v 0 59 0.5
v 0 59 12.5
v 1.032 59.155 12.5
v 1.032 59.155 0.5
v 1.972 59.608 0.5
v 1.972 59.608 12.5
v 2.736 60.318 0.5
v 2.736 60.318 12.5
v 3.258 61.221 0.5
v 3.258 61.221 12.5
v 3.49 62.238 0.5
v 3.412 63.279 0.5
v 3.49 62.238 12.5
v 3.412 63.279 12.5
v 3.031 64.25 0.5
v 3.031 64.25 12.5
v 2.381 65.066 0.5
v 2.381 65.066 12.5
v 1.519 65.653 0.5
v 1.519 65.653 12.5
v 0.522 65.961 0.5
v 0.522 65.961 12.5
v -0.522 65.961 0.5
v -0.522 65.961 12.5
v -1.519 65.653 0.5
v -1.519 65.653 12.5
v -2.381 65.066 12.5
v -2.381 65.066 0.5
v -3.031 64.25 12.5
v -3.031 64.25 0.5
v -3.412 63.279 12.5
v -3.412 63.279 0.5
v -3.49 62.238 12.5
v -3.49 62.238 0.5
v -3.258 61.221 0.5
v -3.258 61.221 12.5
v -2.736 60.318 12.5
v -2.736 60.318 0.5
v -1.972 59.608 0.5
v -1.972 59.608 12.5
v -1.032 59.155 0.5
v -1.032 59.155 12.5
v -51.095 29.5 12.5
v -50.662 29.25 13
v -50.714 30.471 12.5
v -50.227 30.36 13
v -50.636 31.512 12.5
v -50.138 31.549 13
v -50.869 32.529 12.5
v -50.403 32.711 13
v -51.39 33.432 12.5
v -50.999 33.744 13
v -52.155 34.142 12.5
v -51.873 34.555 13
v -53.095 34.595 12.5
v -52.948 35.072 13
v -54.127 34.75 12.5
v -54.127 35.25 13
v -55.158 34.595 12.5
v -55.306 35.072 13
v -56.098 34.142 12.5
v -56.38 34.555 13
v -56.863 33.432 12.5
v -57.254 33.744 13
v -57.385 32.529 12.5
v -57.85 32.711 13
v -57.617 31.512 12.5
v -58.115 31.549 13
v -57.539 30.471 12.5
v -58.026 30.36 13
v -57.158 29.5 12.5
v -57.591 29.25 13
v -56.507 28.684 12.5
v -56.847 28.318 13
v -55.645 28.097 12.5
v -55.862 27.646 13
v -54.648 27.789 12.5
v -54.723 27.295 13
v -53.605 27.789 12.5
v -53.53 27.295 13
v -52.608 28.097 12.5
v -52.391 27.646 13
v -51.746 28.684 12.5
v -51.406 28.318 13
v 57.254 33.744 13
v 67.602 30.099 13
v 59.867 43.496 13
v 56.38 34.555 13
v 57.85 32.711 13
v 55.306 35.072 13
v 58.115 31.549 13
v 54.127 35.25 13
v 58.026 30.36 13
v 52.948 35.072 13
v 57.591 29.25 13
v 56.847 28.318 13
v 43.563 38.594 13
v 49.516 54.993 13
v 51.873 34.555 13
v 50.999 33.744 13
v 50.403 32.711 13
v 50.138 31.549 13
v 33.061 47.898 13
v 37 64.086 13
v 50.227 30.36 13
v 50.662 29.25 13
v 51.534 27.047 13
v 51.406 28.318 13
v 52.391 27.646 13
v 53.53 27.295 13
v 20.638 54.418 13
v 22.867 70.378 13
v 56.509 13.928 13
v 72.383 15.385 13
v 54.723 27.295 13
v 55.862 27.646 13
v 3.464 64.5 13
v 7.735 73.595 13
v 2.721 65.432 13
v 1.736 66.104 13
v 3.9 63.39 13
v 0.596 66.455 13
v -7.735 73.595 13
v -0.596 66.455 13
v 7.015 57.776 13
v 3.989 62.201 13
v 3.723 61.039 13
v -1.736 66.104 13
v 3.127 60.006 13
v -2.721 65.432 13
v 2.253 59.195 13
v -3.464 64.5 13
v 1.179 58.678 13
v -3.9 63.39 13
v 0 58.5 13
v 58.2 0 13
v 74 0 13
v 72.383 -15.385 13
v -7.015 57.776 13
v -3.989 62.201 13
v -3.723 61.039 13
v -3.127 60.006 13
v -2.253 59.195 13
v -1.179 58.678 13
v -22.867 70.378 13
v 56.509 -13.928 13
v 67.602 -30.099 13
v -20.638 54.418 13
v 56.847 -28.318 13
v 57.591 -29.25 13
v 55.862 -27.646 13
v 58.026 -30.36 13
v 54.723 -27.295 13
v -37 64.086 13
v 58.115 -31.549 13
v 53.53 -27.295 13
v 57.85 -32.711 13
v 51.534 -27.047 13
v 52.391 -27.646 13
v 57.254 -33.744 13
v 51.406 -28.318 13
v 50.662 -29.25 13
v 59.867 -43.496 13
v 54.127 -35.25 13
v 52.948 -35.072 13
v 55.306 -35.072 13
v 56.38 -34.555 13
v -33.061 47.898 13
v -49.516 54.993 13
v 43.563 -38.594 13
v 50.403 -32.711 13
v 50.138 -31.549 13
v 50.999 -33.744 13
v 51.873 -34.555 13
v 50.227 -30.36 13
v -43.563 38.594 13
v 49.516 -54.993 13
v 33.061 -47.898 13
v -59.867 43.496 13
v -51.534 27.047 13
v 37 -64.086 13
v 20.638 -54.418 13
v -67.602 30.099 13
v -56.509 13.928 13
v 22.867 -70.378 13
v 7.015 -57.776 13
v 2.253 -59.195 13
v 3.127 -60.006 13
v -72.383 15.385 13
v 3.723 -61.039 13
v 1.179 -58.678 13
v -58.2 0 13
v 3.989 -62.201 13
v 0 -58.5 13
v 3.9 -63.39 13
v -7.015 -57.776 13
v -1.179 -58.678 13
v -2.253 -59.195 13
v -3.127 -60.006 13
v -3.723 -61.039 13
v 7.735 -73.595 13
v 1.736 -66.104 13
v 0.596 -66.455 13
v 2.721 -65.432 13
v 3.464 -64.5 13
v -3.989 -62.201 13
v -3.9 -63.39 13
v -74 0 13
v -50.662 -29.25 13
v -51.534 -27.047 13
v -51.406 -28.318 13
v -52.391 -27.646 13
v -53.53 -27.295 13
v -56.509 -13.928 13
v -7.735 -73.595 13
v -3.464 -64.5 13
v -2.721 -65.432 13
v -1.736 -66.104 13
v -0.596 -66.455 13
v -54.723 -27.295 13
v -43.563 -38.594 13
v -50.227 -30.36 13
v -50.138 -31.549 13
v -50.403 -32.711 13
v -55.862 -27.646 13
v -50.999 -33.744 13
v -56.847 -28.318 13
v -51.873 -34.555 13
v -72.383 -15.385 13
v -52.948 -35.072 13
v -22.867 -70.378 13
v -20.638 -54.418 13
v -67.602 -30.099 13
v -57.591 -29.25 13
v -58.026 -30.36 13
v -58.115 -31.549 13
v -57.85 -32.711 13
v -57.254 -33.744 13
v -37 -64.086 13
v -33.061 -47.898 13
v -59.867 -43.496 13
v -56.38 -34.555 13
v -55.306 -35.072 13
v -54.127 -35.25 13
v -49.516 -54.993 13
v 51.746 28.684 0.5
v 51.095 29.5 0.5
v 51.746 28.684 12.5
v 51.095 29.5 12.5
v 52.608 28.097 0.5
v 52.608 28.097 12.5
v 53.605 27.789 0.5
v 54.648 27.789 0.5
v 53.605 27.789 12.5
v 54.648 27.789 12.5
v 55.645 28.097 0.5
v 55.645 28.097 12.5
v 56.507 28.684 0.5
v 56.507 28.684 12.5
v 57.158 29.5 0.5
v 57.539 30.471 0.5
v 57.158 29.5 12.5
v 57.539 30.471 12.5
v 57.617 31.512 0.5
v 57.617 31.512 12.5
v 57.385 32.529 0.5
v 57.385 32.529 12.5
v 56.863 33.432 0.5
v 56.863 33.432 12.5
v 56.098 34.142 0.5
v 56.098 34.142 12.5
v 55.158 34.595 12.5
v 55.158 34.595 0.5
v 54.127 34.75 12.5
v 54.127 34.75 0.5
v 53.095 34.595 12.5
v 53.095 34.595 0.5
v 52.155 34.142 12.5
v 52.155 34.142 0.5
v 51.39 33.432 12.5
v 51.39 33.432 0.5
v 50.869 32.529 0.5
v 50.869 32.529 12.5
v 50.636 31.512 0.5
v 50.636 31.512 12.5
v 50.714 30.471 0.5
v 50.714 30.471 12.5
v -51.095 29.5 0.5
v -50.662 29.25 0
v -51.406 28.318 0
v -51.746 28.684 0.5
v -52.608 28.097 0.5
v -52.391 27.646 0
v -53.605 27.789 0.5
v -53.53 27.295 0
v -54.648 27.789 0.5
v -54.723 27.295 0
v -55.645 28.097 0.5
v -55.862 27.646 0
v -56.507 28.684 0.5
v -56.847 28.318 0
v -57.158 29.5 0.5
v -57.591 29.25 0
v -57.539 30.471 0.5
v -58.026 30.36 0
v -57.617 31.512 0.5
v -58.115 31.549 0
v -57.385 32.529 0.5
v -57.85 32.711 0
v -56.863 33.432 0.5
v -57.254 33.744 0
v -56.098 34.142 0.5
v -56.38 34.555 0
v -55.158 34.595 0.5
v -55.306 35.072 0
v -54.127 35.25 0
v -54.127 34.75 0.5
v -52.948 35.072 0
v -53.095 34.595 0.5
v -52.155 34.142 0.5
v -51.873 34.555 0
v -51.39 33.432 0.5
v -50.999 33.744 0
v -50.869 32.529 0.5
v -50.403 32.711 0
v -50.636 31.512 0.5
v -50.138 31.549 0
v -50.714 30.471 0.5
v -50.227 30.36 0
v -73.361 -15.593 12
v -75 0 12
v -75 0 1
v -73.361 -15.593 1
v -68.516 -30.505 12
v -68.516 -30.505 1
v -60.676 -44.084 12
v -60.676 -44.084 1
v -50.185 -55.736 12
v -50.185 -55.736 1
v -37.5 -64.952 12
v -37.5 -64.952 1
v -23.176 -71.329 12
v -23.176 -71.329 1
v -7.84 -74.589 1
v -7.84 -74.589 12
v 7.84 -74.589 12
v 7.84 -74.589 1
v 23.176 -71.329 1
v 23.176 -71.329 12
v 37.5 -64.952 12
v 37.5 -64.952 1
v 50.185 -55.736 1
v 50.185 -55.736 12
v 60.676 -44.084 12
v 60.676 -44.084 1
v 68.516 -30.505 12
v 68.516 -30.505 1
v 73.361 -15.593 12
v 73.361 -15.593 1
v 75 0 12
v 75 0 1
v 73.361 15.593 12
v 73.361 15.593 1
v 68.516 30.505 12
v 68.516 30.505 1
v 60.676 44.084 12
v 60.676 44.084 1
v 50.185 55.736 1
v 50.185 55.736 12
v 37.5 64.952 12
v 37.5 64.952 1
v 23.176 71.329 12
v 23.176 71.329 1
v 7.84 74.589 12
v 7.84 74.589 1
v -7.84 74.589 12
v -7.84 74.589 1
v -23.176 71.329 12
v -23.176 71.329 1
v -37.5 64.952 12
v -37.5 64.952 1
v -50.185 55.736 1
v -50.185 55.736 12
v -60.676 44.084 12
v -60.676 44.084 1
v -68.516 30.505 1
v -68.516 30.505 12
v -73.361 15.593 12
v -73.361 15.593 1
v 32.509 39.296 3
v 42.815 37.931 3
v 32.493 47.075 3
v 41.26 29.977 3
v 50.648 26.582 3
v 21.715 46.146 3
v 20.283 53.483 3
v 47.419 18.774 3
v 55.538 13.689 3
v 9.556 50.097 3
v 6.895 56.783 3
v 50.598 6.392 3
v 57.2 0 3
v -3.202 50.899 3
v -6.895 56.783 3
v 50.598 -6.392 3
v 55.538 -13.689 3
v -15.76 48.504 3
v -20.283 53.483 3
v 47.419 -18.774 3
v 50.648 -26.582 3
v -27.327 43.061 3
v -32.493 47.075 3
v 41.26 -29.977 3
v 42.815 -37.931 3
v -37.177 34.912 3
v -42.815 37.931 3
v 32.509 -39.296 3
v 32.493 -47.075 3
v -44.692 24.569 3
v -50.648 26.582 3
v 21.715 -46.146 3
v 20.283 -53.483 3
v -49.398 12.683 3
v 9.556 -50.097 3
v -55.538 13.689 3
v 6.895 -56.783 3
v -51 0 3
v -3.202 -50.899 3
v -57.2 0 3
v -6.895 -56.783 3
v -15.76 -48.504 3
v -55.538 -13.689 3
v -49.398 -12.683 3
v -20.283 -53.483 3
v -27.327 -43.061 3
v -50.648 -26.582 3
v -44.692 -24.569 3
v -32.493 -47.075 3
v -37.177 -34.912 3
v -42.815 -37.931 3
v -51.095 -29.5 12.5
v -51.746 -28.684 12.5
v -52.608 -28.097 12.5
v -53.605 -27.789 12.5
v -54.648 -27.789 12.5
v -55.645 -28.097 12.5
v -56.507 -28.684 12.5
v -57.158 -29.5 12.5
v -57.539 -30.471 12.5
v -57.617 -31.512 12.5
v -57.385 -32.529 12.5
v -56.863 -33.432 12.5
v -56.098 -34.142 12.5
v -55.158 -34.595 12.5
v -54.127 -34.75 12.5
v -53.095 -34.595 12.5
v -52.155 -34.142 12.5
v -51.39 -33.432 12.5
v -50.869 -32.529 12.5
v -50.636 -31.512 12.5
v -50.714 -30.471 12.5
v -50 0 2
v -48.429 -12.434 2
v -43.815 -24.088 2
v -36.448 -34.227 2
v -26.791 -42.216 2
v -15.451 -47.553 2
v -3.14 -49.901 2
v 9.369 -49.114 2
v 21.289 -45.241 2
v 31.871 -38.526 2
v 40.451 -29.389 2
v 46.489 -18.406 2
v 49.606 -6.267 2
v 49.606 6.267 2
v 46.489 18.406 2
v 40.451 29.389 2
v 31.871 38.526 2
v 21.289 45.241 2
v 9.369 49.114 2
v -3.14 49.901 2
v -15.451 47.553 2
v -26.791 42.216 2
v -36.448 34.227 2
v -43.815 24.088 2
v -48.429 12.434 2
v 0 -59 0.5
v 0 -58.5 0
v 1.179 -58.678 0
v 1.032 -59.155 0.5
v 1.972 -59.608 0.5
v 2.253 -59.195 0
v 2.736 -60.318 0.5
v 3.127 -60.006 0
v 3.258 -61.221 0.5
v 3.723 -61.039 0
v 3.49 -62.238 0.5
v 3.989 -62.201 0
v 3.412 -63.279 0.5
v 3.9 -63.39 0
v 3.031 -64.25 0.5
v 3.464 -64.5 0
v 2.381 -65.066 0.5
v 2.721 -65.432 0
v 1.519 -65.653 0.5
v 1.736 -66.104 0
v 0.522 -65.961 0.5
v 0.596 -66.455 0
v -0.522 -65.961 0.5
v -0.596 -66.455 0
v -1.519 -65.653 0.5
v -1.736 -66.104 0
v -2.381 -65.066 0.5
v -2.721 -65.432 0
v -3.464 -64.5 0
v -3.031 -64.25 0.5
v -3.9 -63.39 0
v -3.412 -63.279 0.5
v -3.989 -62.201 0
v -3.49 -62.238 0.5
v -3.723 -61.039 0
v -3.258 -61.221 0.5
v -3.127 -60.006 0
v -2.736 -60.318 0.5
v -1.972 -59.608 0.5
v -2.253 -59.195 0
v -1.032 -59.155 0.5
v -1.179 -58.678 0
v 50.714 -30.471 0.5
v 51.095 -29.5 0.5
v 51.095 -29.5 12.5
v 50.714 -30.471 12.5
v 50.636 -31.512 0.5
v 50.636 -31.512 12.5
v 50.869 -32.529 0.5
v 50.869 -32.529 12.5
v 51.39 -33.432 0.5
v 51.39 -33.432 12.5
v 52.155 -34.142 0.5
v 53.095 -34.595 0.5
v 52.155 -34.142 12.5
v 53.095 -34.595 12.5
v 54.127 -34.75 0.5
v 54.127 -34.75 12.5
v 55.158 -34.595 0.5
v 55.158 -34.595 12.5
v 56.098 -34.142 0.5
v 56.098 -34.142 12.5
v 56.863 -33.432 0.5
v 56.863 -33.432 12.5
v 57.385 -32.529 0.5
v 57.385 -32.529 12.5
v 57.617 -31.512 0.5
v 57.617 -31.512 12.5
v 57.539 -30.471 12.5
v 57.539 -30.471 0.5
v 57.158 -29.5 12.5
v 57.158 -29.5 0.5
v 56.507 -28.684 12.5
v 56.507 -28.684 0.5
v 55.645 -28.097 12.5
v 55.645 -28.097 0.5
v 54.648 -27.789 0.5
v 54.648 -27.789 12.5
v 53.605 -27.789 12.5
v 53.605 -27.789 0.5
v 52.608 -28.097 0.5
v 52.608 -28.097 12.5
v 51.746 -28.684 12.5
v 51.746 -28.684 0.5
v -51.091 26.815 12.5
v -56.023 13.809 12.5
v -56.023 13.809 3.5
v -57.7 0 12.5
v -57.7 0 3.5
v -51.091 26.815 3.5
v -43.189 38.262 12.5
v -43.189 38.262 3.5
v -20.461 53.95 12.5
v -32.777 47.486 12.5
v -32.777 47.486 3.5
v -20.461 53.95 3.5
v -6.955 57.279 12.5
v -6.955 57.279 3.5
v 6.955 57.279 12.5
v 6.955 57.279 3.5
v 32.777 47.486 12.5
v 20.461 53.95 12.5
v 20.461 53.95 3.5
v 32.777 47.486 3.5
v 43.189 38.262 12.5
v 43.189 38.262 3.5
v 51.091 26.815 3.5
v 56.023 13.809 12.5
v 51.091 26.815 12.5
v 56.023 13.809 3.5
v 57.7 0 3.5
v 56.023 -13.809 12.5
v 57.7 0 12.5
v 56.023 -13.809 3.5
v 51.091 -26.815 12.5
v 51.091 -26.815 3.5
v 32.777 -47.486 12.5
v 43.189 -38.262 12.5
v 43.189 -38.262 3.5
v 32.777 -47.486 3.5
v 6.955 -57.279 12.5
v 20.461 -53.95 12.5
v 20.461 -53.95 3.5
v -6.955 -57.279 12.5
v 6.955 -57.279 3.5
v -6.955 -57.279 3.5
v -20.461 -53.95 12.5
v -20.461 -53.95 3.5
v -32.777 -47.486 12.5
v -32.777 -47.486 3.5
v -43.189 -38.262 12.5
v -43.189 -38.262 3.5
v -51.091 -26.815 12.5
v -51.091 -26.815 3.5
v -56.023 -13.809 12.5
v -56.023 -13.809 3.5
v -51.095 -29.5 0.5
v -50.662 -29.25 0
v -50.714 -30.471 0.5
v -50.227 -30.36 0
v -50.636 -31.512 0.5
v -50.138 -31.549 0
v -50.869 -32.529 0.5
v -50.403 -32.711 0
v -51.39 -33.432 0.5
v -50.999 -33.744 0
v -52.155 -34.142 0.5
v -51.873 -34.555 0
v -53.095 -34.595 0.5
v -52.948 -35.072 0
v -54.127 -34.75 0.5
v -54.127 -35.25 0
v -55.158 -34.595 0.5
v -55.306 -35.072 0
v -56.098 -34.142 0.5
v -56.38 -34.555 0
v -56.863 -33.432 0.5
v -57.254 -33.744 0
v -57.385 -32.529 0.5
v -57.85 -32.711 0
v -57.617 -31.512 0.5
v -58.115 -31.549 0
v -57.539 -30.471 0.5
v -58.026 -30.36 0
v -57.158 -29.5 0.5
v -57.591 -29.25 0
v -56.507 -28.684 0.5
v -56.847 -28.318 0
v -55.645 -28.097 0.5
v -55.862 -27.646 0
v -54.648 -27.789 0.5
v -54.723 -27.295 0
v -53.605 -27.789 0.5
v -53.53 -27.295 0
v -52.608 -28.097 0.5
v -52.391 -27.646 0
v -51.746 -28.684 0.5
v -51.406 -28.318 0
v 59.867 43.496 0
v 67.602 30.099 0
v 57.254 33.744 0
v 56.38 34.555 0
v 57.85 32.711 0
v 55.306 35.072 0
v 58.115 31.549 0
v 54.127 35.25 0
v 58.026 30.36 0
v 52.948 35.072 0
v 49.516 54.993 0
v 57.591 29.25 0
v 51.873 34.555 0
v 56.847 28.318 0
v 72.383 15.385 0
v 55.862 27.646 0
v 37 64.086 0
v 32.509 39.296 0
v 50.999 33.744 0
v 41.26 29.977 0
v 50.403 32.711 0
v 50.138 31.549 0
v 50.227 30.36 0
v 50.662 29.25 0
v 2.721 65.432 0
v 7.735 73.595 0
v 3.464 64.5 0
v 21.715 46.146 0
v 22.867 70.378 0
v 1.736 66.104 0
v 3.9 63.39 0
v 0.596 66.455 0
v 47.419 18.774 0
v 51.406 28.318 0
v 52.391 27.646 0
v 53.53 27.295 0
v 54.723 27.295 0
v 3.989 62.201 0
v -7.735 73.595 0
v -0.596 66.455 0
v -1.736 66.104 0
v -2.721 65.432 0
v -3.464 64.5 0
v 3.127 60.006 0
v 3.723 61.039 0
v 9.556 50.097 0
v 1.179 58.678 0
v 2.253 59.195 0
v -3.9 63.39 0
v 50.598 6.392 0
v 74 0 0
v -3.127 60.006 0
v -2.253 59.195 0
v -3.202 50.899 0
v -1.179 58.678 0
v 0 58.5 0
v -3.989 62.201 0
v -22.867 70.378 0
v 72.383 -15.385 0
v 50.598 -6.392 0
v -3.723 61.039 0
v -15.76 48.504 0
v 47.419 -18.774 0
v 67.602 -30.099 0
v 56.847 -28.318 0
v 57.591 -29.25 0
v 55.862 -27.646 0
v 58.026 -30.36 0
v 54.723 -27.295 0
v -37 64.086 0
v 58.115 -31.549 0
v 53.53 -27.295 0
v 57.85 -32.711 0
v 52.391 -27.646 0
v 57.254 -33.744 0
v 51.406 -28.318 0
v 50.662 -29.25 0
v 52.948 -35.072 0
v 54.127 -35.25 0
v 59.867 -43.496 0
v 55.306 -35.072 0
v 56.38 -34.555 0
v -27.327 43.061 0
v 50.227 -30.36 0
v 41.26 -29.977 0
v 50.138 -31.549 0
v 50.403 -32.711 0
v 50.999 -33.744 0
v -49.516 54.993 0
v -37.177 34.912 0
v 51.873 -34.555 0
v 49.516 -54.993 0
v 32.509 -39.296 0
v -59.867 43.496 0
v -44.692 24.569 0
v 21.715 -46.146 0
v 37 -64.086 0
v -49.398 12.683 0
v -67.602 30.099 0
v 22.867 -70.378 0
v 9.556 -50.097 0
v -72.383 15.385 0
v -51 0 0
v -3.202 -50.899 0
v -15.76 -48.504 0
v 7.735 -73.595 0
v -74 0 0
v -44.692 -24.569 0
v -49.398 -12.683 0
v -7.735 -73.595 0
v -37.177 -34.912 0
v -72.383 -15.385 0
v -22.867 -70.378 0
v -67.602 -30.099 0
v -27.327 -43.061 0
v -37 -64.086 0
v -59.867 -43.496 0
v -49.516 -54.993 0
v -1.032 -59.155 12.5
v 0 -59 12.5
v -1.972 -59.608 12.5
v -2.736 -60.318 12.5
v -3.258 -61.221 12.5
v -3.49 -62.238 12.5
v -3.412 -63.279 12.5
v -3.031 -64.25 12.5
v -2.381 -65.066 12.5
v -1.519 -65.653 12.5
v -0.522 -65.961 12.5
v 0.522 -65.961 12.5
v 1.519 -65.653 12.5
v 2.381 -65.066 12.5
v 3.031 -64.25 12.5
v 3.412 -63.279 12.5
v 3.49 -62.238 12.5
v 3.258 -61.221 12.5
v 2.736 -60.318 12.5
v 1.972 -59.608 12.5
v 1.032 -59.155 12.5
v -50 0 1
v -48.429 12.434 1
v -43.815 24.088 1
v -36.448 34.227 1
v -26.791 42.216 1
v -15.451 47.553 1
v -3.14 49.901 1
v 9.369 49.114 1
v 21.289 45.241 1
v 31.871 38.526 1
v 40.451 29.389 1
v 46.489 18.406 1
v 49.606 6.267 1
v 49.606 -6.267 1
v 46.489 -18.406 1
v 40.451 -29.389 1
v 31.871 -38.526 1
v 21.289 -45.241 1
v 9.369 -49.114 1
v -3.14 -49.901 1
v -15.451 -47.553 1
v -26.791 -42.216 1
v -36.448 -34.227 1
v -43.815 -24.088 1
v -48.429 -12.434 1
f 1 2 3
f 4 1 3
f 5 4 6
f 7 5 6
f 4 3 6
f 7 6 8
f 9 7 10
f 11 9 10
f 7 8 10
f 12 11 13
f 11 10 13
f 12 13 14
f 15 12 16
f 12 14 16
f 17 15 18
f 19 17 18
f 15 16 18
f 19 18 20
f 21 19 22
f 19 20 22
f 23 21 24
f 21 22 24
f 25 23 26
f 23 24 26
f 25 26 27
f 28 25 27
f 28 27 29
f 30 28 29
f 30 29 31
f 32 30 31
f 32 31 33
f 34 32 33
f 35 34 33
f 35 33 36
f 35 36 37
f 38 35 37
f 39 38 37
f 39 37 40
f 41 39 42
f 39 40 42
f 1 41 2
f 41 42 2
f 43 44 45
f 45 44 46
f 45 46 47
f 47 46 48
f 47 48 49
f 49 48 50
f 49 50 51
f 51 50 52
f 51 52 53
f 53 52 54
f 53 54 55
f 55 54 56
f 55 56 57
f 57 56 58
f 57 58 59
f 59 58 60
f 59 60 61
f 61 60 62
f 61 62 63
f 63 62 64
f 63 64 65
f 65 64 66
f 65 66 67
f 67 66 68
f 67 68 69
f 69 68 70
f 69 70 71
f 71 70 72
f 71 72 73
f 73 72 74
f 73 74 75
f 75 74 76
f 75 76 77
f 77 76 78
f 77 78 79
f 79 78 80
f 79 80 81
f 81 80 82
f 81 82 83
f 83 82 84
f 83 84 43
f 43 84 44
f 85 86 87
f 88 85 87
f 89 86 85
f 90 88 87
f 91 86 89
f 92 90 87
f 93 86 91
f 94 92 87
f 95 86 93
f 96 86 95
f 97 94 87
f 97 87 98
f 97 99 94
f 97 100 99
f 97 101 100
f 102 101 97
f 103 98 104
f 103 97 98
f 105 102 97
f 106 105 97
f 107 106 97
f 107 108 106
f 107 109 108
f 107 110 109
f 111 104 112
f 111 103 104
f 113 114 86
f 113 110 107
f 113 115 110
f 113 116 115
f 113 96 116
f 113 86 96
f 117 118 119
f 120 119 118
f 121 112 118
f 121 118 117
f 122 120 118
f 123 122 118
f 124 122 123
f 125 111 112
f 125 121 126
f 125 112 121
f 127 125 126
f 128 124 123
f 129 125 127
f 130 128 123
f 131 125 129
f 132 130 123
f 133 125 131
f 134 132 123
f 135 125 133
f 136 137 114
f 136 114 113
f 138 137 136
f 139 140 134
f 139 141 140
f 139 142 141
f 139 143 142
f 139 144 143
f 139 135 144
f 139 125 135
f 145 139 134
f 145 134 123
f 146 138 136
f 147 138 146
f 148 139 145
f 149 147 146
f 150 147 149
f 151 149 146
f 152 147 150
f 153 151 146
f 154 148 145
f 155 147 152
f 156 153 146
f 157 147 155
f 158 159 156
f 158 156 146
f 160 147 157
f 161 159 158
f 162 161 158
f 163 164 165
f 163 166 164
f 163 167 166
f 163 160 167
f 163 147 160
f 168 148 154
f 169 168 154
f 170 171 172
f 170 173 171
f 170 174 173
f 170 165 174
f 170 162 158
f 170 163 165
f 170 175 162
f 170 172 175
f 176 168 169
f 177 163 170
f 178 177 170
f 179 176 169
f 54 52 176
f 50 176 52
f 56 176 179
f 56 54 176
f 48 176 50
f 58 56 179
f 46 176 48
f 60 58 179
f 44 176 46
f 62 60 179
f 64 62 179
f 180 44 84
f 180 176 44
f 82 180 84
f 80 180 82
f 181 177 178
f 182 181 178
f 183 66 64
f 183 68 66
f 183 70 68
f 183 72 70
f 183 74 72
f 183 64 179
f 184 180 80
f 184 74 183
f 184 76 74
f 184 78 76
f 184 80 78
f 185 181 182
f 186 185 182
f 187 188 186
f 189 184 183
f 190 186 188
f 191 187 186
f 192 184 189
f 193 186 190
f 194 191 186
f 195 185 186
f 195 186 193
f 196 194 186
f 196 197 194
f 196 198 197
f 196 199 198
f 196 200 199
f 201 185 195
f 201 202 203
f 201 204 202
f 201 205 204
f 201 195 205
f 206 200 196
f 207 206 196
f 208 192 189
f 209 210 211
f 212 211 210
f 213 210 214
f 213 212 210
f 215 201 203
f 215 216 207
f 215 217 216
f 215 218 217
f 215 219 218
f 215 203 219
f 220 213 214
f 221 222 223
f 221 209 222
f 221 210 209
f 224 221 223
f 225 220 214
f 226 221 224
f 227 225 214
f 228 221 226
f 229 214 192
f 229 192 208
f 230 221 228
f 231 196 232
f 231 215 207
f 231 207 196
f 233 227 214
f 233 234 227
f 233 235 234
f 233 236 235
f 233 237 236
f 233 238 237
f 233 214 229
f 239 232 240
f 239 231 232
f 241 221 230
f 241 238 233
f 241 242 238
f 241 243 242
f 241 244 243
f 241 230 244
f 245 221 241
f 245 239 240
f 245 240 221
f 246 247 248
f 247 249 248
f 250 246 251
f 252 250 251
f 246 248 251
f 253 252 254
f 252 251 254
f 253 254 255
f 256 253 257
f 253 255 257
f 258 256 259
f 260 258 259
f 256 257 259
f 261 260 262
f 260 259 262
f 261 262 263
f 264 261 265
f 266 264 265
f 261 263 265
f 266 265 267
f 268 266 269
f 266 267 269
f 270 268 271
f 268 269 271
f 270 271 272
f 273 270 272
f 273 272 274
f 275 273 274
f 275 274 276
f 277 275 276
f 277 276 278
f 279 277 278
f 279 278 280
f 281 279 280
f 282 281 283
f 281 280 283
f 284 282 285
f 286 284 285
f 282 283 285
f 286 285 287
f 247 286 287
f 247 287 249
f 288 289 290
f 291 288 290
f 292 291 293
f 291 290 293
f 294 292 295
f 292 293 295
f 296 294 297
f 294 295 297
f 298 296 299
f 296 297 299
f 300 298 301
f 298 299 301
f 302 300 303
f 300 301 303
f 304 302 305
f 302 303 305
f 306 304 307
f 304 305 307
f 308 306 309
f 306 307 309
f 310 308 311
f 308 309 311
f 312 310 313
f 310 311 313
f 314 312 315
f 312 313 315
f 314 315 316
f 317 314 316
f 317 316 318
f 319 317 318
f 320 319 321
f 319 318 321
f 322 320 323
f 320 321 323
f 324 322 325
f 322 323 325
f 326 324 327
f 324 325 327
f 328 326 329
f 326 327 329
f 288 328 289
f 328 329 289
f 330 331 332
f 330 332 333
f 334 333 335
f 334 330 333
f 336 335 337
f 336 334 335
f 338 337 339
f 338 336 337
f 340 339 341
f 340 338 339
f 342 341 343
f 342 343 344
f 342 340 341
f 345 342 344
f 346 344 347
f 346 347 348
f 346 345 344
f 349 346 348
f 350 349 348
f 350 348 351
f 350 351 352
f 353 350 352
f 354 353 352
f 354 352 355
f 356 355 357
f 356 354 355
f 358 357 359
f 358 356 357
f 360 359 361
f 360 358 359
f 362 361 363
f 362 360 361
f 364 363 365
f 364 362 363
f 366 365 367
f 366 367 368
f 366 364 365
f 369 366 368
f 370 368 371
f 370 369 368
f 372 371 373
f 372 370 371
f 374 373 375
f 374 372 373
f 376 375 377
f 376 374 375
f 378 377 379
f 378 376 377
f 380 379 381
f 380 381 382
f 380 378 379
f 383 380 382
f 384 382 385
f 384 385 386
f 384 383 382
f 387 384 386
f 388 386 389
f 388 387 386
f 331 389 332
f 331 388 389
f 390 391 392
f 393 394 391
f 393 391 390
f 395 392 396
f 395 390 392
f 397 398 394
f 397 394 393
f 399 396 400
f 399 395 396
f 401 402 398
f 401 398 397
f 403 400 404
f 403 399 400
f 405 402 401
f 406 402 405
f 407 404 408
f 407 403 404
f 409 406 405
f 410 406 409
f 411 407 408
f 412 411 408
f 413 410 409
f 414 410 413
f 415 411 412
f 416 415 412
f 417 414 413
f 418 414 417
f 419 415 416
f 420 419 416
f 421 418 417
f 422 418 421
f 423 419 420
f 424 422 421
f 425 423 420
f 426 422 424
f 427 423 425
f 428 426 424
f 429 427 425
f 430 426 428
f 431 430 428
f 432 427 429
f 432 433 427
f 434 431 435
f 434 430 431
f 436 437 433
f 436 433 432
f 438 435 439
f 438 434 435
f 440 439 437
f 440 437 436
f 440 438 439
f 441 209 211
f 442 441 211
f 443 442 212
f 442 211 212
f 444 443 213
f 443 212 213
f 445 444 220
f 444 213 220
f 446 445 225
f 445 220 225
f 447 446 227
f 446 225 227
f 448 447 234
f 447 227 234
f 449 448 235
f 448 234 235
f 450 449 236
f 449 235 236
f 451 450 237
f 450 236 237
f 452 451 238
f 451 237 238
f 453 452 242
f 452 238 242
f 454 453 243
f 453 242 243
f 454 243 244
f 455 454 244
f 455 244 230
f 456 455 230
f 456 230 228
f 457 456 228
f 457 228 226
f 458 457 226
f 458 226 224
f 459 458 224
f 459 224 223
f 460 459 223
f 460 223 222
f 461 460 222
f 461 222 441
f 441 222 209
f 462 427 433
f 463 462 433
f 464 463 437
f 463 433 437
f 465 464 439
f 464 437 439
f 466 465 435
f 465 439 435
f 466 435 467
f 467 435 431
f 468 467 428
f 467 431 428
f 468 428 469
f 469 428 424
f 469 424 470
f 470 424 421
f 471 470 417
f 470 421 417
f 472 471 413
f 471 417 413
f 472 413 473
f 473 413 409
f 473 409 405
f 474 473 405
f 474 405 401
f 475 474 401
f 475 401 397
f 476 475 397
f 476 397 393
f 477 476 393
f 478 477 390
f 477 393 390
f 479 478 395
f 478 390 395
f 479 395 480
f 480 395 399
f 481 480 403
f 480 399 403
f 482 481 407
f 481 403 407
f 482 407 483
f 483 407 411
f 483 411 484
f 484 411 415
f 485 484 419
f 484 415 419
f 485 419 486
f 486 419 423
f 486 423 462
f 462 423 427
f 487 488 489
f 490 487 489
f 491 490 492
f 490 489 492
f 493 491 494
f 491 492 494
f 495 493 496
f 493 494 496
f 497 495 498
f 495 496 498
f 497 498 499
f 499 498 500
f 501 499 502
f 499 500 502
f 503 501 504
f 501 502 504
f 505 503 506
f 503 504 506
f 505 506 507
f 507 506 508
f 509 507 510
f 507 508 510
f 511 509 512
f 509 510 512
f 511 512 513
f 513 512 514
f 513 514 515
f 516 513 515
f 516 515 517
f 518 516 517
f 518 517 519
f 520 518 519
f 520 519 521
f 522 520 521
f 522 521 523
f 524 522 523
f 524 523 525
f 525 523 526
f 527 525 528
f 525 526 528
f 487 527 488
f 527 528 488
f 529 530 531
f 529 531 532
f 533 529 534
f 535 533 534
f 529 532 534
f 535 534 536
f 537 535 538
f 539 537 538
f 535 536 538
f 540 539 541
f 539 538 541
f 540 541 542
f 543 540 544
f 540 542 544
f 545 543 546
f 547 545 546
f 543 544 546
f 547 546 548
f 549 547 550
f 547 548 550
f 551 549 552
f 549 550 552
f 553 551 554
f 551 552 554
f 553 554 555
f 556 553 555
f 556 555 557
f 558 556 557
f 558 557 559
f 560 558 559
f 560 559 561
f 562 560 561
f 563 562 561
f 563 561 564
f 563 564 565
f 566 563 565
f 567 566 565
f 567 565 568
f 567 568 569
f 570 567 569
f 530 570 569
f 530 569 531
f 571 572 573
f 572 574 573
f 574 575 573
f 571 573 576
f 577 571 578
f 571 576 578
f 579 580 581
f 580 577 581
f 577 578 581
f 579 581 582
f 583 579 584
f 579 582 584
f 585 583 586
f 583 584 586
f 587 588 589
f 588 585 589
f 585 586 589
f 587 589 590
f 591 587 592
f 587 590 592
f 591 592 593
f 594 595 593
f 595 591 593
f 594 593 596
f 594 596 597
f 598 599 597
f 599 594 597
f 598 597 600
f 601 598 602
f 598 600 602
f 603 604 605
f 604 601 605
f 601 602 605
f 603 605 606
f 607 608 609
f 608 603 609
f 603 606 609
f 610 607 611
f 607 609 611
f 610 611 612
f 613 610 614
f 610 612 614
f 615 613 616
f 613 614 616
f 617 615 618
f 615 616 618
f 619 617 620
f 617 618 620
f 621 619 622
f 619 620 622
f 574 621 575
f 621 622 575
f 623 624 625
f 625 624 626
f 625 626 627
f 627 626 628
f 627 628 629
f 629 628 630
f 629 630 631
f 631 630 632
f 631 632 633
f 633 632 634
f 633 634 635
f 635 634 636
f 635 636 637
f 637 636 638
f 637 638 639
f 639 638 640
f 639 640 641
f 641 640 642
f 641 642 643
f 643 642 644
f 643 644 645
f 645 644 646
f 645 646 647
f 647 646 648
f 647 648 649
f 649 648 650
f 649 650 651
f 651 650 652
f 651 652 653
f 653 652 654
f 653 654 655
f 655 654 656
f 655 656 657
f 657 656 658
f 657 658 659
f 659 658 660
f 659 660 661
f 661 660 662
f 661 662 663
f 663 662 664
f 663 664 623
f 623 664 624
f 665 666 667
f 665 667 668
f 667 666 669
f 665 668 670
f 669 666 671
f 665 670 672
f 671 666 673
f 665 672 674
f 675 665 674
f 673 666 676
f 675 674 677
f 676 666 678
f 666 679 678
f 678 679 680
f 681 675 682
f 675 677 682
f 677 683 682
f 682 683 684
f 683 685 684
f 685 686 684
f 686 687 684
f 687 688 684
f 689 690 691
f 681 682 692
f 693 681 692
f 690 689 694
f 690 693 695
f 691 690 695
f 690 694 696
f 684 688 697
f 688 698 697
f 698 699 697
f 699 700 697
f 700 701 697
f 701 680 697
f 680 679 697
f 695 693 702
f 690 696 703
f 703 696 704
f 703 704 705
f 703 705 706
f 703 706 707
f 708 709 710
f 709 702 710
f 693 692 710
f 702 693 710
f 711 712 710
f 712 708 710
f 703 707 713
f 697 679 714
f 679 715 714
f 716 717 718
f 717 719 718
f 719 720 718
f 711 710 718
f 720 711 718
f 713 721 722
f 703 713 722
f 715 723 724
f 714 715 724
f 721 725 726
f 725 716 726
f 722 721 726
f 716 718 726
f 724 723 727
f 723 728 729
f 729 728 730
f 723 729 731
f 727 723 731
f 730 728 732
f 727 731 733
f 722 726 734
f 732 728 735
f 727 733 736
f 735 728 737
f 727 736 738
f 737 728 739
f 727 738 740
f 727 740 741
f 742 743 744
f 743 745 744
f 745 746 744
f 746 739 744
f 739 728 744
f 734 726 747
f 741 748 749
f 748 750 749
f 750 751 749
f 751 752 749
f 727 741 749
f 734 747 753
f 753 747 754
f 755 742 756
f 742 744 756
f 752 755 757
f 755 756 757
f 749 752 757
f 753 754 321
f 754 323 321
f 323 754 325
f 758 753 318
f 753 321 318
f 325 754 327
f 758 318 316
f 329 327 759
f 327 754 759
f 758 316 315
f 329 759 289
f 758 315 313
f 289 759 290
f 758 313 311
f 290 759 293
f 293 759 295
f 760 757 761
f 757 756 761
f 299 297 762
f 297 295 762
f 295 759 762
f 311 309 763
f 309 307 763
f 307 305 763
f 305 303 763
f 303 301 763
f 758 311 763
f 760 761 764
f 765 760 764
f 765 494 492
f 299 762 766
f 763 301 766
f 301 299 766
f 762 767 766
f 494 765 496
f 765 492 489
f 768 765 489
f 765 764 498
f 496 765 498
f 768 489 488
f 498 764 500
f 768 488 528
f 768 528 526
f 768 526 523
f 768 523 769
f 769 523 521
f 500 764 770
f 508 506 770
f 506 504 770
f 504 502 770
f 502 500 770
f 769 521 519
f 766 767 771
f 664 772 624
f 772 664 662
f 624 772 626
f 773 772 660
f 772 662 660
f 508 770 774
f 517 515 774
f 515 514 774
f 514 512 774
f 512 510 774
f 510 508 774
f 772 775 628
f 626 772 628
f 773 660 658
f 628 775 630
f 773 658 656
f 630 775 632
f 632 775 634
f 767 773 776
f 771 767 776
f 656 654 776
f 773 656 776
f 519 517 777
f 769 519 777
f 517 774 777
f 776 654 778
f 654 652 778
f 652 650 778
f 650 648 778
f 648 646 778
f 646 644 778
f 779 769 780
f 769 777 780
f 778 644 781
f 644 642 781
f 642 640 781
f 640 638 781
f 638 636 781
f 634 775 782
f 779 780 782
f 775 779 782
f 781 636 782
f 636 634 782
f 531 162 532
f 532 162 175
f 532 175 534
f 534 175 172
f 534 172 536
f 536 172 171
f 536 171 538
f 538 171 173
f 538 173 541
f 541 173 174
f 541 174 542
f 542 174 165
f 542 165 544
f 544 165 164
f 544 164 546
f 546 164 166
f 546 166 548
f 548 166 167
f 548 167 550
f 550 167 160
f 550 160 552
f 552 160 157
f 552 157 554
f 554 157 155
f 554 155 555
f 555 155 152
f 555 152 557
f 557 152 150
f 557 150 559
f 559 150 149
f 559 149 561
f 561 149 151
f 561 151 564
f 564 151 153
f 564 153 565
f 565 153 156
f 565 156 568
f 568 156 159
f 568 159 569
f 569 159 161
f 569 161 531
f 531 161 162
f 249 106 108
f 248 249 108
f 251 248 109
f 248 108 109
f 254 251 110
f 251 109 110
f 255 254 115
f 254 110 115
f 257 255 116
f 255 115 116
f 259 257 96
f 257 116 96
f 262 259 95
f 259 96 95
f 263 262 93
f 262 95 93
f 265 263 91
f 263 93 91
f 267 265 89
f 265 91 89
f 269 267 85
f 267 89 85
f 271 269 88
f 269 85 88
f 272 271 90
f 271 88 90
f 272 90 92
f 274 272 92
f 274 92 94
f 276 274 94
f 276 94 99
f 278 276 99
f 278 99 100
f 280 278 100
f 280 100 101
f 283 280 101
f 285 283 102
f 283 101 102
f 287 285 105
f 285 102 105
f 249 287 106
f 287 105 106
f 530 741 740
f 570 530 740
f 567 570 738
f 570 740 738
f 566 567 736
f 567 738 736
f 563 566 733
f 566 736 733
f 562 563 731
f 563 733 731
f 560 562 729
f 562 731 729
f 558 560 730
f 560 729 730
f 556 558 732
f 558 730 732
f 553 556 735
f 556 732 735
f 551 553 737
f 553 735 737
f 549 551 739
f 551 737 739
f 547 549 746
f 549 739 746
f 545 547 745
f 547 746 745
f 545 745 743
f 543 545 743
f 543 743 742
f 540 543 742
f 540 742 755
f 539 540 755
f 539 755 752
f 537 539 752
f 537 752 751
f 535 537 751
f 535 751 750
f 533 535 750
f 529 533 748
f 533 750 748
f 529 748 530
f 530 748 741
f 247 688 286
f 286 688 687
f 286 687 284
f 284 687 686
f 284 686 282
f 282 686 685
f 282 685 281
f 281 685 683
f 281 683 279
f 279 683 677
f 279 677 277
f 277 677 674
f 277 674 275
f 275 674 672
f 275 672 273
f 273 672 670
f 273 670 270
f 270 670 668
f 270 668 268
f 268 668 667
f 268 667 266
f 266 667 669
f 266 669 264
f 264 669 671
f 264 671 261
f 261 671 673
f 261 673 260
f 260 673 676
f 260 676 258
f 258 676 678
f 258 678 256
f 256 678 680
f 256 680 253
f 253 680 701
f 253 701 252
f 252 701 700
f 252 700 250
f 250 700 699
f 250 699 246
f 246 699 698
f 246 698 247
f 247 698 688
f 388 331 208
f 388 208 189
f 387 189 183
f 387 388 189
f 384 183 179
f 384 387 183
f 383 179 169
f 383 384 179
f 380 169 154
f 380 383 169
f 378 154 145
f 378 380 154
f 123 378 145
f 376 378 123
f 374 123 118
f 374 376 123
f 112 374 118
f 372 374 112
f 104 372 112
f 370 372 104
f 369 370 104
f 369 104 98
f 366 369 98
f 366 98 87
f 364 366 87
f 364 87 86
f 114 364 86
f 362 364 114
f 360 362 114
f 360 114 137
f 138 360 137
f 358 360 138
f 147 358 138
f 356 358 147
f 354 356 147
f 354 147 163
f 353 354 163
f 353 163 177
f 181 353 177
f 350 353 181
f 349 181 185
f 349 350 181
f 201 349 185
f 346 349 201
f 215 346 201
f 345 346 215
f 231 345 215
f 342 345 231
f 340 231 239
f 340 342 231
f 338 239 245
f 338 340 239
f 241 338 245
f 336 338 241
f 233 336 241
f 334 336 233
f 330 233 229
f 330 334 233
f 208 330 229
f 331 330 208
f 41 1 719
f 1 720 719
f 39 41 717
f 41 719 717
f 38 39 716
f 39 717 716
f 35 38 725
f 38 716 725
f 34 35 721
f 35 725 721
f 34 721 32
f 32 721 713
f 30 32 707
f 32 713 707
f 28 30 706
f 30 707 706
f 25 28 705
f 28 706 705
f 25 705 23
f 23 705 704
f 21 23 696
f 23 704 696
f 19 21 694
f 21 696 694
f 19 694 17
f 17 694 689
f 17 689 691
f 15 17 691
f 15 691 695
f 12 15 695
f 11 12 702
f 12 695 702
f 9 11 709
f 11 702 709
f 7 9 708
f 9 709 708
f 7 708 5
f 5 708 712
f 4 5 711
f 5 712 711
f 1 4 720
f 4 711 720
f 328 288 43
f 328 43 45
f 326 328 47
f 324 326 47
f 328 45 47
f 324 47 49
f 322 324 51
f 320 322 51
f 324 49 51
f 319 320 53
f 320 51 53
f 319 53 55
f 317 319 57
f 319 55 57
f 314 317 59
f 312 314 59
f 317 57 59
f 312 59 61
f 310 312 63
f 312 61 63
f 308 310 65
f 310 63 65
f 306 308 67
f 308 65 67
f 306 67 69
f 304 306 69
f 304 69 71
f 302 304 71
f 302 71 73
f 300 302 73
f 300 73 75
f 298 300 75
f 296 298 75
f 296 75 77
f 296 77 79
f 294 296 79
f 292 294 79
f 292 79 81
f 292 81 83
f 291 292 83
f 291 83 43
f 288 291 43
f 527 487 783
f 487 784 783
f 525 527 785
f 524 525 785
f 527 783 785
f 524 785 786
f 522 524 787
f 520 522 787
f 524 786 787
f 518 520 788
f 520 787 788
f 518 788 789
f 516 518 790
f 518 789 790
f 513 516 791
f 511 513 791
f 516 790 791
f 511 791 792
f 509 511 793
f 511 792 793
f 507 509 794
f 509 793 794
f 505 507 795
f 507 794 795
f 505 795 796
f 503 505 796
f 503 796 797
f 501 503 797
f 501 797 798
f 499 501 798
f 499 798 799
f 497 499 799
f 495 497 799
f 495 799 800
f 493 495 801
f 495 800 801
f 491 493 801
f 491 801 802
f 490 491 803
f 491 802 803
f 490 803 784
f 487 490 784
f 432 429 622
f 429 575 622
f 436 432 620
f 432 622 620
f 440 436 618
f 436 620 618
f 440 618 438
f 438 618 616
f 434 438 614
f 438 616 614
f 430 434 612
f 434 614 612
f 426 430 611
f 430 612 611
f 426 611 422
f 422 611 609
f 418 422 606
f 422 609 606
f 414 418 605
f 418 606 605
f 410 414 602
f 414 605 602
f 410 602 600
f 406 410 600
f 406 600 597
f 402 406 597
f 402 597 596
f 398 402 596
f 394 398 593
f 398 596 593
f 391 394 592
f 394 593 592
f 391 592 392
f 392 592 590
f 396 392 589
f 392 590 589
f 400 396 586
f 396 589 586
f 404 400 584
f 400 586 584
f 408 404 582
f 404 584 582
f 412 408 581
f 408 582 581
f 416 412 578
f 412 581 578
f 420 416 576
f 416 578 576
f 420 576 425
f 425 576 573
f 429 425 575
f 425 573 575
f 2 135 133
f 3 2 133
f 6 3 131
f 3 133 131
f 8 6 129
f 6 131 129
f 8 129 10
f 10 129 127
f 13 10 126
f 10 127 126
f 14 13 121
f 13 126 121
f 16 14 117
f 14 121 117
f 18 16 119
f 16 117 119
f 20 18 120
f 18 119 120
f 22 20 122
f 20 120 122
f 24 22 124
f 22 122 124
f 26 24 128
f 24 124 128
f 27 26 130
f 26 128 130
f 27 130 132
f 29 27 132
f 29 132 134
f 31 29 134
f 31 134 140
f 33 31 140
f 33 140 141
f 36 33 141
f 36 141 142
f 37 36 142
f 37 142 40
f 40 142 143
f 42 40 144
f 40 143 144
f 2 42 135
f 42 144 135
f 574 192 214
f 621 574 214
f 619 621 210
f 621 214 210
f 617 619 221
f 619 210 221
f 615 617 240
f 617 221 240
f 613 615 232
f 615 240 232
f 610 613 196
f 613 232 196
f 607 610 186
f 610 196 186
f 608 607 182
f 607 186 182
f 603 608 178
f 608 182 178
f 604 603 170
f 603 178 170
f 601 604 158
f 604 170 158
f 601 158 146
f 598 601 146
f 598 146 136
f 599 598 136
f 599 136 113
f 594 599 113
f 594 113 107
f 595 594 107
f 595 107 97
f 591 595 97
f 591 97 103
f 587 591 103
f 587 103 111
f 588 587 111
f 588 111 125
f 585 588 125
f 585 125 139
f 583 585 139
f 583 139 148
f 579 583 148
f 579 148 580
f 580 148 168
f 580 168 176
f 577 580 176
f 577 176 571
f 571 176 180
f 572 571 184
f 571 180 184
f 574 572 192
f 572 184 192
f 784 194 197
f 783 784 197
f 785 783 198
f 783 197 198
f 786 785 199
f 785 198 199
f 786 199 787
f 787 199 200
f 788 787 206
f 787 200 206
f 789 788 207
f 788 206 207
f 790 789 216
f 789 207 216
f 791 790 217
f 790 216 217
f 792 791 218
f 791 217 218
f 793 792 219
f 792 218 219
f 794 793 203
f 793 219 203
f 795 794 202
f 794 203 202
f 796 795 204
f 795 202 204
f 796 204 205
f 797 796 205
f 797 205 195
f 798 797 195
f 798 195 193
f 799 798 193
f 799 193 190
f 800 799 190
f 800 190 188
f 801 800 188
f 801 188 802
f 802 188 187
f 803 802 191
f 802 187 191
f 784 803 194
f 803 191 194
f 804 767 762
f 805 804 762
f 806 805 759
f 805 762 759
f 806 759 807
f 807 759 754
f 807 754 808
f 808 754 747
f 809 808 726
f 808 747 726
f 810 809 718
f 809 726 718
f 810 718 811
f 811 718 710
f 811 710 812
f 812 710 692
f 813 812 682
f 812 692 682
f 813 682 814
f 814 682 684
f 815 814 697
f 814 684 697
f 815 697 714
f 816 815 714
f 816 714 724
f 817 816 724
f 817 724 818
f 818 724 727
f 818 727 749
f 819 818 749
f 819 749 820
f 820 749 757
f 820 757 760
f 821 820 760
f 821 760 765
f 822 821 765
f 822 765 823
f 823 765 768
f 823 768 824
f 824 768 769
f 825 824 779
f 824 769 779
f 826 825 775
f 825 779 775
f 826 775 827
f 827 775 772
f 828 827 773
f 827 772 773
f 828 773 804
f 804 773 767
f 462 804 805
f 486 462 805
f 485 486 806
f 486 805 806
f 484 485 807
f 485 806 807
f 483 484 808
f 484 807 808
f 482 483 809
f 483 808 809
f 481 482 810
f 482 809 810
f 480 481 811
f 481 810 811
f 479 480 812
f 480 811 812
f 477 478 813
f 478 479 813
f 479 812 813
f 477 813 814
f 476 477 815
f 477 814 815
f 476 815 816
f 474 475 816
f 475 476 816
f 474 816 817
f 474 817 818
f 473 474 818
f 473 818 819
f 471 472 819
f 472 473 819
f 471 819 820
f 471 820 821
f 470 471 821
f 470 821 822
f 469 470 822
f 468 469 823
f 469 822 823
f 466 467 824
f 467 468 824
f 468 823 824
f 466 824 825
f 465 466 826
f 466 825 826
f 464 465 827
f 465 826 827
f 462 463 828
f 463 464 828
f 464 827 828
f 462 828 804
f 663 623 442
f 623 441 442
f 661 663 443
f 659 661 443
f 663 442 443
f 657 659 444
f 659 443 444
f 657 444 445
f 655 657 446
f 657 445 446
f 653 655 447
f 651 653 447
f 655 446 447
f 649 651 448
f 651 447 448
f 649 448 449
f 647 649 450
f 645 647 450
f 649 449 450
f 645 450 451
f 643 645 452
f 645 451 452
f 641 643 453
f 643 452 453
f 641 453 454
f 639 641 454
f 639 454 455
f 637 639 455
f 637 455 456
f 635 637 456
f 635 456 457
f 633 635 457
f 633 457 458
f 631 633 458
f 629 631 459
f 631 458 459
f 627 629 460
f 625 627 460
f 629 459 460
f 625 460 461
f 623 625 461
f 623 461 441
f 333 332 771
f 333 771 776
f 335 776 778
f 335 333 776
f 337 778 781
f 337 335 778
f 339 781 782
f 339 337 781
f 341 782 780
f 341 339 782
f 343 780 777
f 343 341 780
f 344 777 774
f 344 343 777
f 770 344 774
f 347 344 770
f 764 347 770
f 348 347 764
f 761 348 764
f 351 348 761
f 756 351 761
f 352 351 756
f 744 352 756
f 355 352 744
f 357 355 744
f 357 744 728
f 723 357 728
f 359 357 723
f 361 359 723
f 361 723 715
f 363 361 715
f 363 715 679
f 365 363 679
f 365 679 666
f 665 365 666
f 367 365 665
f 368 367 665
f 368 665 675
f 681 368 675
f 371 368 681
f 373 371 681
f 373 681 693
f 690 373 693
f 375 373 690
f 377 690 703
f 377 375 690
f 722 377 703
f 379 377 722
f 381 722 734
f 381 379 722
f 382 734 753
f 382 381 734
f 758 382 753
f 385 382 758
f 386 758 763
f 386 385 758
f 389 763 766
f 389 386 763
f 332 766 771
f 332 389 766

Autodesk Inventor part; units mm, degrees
ref_plane "YZ Plane" through (0, 0, 0) normal (1, 0, 0) x (0, 1, 0)
ref_plane "XZ Plane" through (0, 0, 0) normal (0, 1, 0) x (-1, 0, 0)
ref_plane "XY Plane" through (0, 0, 0) normal (0, 0, 1) x (1, 0, 0)
sketch "Sketch2" plane through (0, 0, 0) normal (0, 1, 0) x (-1, 0, 0)
  line L0 (0, 0) -> (0, 13)
  line L1 (50, 0) -> (75, 0)
  line L2 (75, 0) -> (75, 13)
  line L3 (75, 13) -> (57.7, 13)
  line L4 (57.7, 13) -> (57.7, 3)
  line L5 (57.7, 3) -> (50, 3)
  line L6 (50, 3) -> (50, 0)
  dimension "d1" = 100
  dimension "d2" = 150
  dimension "d3" = 115.4
  dimension "d4" = 3
  dimension "d5" = 10
revolve "Revolution1" add sketch "Sketch2" angle 360 about axis through (0, 0, 0) along (0, 0, 1)
sketch "Sketch3" plane through (0, 0, 0) normal (0, 0, -1) x (-1, 0, 0)
  circle A0 centre (0, 0) radius 62.5 construction
  point P0 (0, -62.5)
  dimension "d7" = 125
hole "Hole1" at (0, -62.5, 0) direction (0, 0, 1) diameter 7 end through all
pattern_circular "Circular Pattern1" count 6 over 360 about axis through (0, 0, -10) along (0, 0, 1) of "Hole1"
chamfer "Chamfer1" distance 1 angle 45 4 edges at (75, 0, 0) (50, 0, 0) (50, 0, 3) (75, 0, 13)
chamfer "Chamfer2" distance 0.5 angle 45 12 edges at (57.1577, 33, 0) (0, 66, 0) (-57.1577, 33, 0) (-57.1577, -33, 0) (0, -66, 0) (57.1577, -33, 0) (57.1577, 33, 13) (57.1577, -33, 13) (0, -66, 13) (-57.1577, -33, 13) (-57.1577, 33, 13) (0, 66, 13)
chamfer "Chamfer3" distance 0.5 angle 45 2 edges at (57.7, 0, 13) (57.7, 0, 3)
properties part number "akf-100-window" material "ABS Plastic"
